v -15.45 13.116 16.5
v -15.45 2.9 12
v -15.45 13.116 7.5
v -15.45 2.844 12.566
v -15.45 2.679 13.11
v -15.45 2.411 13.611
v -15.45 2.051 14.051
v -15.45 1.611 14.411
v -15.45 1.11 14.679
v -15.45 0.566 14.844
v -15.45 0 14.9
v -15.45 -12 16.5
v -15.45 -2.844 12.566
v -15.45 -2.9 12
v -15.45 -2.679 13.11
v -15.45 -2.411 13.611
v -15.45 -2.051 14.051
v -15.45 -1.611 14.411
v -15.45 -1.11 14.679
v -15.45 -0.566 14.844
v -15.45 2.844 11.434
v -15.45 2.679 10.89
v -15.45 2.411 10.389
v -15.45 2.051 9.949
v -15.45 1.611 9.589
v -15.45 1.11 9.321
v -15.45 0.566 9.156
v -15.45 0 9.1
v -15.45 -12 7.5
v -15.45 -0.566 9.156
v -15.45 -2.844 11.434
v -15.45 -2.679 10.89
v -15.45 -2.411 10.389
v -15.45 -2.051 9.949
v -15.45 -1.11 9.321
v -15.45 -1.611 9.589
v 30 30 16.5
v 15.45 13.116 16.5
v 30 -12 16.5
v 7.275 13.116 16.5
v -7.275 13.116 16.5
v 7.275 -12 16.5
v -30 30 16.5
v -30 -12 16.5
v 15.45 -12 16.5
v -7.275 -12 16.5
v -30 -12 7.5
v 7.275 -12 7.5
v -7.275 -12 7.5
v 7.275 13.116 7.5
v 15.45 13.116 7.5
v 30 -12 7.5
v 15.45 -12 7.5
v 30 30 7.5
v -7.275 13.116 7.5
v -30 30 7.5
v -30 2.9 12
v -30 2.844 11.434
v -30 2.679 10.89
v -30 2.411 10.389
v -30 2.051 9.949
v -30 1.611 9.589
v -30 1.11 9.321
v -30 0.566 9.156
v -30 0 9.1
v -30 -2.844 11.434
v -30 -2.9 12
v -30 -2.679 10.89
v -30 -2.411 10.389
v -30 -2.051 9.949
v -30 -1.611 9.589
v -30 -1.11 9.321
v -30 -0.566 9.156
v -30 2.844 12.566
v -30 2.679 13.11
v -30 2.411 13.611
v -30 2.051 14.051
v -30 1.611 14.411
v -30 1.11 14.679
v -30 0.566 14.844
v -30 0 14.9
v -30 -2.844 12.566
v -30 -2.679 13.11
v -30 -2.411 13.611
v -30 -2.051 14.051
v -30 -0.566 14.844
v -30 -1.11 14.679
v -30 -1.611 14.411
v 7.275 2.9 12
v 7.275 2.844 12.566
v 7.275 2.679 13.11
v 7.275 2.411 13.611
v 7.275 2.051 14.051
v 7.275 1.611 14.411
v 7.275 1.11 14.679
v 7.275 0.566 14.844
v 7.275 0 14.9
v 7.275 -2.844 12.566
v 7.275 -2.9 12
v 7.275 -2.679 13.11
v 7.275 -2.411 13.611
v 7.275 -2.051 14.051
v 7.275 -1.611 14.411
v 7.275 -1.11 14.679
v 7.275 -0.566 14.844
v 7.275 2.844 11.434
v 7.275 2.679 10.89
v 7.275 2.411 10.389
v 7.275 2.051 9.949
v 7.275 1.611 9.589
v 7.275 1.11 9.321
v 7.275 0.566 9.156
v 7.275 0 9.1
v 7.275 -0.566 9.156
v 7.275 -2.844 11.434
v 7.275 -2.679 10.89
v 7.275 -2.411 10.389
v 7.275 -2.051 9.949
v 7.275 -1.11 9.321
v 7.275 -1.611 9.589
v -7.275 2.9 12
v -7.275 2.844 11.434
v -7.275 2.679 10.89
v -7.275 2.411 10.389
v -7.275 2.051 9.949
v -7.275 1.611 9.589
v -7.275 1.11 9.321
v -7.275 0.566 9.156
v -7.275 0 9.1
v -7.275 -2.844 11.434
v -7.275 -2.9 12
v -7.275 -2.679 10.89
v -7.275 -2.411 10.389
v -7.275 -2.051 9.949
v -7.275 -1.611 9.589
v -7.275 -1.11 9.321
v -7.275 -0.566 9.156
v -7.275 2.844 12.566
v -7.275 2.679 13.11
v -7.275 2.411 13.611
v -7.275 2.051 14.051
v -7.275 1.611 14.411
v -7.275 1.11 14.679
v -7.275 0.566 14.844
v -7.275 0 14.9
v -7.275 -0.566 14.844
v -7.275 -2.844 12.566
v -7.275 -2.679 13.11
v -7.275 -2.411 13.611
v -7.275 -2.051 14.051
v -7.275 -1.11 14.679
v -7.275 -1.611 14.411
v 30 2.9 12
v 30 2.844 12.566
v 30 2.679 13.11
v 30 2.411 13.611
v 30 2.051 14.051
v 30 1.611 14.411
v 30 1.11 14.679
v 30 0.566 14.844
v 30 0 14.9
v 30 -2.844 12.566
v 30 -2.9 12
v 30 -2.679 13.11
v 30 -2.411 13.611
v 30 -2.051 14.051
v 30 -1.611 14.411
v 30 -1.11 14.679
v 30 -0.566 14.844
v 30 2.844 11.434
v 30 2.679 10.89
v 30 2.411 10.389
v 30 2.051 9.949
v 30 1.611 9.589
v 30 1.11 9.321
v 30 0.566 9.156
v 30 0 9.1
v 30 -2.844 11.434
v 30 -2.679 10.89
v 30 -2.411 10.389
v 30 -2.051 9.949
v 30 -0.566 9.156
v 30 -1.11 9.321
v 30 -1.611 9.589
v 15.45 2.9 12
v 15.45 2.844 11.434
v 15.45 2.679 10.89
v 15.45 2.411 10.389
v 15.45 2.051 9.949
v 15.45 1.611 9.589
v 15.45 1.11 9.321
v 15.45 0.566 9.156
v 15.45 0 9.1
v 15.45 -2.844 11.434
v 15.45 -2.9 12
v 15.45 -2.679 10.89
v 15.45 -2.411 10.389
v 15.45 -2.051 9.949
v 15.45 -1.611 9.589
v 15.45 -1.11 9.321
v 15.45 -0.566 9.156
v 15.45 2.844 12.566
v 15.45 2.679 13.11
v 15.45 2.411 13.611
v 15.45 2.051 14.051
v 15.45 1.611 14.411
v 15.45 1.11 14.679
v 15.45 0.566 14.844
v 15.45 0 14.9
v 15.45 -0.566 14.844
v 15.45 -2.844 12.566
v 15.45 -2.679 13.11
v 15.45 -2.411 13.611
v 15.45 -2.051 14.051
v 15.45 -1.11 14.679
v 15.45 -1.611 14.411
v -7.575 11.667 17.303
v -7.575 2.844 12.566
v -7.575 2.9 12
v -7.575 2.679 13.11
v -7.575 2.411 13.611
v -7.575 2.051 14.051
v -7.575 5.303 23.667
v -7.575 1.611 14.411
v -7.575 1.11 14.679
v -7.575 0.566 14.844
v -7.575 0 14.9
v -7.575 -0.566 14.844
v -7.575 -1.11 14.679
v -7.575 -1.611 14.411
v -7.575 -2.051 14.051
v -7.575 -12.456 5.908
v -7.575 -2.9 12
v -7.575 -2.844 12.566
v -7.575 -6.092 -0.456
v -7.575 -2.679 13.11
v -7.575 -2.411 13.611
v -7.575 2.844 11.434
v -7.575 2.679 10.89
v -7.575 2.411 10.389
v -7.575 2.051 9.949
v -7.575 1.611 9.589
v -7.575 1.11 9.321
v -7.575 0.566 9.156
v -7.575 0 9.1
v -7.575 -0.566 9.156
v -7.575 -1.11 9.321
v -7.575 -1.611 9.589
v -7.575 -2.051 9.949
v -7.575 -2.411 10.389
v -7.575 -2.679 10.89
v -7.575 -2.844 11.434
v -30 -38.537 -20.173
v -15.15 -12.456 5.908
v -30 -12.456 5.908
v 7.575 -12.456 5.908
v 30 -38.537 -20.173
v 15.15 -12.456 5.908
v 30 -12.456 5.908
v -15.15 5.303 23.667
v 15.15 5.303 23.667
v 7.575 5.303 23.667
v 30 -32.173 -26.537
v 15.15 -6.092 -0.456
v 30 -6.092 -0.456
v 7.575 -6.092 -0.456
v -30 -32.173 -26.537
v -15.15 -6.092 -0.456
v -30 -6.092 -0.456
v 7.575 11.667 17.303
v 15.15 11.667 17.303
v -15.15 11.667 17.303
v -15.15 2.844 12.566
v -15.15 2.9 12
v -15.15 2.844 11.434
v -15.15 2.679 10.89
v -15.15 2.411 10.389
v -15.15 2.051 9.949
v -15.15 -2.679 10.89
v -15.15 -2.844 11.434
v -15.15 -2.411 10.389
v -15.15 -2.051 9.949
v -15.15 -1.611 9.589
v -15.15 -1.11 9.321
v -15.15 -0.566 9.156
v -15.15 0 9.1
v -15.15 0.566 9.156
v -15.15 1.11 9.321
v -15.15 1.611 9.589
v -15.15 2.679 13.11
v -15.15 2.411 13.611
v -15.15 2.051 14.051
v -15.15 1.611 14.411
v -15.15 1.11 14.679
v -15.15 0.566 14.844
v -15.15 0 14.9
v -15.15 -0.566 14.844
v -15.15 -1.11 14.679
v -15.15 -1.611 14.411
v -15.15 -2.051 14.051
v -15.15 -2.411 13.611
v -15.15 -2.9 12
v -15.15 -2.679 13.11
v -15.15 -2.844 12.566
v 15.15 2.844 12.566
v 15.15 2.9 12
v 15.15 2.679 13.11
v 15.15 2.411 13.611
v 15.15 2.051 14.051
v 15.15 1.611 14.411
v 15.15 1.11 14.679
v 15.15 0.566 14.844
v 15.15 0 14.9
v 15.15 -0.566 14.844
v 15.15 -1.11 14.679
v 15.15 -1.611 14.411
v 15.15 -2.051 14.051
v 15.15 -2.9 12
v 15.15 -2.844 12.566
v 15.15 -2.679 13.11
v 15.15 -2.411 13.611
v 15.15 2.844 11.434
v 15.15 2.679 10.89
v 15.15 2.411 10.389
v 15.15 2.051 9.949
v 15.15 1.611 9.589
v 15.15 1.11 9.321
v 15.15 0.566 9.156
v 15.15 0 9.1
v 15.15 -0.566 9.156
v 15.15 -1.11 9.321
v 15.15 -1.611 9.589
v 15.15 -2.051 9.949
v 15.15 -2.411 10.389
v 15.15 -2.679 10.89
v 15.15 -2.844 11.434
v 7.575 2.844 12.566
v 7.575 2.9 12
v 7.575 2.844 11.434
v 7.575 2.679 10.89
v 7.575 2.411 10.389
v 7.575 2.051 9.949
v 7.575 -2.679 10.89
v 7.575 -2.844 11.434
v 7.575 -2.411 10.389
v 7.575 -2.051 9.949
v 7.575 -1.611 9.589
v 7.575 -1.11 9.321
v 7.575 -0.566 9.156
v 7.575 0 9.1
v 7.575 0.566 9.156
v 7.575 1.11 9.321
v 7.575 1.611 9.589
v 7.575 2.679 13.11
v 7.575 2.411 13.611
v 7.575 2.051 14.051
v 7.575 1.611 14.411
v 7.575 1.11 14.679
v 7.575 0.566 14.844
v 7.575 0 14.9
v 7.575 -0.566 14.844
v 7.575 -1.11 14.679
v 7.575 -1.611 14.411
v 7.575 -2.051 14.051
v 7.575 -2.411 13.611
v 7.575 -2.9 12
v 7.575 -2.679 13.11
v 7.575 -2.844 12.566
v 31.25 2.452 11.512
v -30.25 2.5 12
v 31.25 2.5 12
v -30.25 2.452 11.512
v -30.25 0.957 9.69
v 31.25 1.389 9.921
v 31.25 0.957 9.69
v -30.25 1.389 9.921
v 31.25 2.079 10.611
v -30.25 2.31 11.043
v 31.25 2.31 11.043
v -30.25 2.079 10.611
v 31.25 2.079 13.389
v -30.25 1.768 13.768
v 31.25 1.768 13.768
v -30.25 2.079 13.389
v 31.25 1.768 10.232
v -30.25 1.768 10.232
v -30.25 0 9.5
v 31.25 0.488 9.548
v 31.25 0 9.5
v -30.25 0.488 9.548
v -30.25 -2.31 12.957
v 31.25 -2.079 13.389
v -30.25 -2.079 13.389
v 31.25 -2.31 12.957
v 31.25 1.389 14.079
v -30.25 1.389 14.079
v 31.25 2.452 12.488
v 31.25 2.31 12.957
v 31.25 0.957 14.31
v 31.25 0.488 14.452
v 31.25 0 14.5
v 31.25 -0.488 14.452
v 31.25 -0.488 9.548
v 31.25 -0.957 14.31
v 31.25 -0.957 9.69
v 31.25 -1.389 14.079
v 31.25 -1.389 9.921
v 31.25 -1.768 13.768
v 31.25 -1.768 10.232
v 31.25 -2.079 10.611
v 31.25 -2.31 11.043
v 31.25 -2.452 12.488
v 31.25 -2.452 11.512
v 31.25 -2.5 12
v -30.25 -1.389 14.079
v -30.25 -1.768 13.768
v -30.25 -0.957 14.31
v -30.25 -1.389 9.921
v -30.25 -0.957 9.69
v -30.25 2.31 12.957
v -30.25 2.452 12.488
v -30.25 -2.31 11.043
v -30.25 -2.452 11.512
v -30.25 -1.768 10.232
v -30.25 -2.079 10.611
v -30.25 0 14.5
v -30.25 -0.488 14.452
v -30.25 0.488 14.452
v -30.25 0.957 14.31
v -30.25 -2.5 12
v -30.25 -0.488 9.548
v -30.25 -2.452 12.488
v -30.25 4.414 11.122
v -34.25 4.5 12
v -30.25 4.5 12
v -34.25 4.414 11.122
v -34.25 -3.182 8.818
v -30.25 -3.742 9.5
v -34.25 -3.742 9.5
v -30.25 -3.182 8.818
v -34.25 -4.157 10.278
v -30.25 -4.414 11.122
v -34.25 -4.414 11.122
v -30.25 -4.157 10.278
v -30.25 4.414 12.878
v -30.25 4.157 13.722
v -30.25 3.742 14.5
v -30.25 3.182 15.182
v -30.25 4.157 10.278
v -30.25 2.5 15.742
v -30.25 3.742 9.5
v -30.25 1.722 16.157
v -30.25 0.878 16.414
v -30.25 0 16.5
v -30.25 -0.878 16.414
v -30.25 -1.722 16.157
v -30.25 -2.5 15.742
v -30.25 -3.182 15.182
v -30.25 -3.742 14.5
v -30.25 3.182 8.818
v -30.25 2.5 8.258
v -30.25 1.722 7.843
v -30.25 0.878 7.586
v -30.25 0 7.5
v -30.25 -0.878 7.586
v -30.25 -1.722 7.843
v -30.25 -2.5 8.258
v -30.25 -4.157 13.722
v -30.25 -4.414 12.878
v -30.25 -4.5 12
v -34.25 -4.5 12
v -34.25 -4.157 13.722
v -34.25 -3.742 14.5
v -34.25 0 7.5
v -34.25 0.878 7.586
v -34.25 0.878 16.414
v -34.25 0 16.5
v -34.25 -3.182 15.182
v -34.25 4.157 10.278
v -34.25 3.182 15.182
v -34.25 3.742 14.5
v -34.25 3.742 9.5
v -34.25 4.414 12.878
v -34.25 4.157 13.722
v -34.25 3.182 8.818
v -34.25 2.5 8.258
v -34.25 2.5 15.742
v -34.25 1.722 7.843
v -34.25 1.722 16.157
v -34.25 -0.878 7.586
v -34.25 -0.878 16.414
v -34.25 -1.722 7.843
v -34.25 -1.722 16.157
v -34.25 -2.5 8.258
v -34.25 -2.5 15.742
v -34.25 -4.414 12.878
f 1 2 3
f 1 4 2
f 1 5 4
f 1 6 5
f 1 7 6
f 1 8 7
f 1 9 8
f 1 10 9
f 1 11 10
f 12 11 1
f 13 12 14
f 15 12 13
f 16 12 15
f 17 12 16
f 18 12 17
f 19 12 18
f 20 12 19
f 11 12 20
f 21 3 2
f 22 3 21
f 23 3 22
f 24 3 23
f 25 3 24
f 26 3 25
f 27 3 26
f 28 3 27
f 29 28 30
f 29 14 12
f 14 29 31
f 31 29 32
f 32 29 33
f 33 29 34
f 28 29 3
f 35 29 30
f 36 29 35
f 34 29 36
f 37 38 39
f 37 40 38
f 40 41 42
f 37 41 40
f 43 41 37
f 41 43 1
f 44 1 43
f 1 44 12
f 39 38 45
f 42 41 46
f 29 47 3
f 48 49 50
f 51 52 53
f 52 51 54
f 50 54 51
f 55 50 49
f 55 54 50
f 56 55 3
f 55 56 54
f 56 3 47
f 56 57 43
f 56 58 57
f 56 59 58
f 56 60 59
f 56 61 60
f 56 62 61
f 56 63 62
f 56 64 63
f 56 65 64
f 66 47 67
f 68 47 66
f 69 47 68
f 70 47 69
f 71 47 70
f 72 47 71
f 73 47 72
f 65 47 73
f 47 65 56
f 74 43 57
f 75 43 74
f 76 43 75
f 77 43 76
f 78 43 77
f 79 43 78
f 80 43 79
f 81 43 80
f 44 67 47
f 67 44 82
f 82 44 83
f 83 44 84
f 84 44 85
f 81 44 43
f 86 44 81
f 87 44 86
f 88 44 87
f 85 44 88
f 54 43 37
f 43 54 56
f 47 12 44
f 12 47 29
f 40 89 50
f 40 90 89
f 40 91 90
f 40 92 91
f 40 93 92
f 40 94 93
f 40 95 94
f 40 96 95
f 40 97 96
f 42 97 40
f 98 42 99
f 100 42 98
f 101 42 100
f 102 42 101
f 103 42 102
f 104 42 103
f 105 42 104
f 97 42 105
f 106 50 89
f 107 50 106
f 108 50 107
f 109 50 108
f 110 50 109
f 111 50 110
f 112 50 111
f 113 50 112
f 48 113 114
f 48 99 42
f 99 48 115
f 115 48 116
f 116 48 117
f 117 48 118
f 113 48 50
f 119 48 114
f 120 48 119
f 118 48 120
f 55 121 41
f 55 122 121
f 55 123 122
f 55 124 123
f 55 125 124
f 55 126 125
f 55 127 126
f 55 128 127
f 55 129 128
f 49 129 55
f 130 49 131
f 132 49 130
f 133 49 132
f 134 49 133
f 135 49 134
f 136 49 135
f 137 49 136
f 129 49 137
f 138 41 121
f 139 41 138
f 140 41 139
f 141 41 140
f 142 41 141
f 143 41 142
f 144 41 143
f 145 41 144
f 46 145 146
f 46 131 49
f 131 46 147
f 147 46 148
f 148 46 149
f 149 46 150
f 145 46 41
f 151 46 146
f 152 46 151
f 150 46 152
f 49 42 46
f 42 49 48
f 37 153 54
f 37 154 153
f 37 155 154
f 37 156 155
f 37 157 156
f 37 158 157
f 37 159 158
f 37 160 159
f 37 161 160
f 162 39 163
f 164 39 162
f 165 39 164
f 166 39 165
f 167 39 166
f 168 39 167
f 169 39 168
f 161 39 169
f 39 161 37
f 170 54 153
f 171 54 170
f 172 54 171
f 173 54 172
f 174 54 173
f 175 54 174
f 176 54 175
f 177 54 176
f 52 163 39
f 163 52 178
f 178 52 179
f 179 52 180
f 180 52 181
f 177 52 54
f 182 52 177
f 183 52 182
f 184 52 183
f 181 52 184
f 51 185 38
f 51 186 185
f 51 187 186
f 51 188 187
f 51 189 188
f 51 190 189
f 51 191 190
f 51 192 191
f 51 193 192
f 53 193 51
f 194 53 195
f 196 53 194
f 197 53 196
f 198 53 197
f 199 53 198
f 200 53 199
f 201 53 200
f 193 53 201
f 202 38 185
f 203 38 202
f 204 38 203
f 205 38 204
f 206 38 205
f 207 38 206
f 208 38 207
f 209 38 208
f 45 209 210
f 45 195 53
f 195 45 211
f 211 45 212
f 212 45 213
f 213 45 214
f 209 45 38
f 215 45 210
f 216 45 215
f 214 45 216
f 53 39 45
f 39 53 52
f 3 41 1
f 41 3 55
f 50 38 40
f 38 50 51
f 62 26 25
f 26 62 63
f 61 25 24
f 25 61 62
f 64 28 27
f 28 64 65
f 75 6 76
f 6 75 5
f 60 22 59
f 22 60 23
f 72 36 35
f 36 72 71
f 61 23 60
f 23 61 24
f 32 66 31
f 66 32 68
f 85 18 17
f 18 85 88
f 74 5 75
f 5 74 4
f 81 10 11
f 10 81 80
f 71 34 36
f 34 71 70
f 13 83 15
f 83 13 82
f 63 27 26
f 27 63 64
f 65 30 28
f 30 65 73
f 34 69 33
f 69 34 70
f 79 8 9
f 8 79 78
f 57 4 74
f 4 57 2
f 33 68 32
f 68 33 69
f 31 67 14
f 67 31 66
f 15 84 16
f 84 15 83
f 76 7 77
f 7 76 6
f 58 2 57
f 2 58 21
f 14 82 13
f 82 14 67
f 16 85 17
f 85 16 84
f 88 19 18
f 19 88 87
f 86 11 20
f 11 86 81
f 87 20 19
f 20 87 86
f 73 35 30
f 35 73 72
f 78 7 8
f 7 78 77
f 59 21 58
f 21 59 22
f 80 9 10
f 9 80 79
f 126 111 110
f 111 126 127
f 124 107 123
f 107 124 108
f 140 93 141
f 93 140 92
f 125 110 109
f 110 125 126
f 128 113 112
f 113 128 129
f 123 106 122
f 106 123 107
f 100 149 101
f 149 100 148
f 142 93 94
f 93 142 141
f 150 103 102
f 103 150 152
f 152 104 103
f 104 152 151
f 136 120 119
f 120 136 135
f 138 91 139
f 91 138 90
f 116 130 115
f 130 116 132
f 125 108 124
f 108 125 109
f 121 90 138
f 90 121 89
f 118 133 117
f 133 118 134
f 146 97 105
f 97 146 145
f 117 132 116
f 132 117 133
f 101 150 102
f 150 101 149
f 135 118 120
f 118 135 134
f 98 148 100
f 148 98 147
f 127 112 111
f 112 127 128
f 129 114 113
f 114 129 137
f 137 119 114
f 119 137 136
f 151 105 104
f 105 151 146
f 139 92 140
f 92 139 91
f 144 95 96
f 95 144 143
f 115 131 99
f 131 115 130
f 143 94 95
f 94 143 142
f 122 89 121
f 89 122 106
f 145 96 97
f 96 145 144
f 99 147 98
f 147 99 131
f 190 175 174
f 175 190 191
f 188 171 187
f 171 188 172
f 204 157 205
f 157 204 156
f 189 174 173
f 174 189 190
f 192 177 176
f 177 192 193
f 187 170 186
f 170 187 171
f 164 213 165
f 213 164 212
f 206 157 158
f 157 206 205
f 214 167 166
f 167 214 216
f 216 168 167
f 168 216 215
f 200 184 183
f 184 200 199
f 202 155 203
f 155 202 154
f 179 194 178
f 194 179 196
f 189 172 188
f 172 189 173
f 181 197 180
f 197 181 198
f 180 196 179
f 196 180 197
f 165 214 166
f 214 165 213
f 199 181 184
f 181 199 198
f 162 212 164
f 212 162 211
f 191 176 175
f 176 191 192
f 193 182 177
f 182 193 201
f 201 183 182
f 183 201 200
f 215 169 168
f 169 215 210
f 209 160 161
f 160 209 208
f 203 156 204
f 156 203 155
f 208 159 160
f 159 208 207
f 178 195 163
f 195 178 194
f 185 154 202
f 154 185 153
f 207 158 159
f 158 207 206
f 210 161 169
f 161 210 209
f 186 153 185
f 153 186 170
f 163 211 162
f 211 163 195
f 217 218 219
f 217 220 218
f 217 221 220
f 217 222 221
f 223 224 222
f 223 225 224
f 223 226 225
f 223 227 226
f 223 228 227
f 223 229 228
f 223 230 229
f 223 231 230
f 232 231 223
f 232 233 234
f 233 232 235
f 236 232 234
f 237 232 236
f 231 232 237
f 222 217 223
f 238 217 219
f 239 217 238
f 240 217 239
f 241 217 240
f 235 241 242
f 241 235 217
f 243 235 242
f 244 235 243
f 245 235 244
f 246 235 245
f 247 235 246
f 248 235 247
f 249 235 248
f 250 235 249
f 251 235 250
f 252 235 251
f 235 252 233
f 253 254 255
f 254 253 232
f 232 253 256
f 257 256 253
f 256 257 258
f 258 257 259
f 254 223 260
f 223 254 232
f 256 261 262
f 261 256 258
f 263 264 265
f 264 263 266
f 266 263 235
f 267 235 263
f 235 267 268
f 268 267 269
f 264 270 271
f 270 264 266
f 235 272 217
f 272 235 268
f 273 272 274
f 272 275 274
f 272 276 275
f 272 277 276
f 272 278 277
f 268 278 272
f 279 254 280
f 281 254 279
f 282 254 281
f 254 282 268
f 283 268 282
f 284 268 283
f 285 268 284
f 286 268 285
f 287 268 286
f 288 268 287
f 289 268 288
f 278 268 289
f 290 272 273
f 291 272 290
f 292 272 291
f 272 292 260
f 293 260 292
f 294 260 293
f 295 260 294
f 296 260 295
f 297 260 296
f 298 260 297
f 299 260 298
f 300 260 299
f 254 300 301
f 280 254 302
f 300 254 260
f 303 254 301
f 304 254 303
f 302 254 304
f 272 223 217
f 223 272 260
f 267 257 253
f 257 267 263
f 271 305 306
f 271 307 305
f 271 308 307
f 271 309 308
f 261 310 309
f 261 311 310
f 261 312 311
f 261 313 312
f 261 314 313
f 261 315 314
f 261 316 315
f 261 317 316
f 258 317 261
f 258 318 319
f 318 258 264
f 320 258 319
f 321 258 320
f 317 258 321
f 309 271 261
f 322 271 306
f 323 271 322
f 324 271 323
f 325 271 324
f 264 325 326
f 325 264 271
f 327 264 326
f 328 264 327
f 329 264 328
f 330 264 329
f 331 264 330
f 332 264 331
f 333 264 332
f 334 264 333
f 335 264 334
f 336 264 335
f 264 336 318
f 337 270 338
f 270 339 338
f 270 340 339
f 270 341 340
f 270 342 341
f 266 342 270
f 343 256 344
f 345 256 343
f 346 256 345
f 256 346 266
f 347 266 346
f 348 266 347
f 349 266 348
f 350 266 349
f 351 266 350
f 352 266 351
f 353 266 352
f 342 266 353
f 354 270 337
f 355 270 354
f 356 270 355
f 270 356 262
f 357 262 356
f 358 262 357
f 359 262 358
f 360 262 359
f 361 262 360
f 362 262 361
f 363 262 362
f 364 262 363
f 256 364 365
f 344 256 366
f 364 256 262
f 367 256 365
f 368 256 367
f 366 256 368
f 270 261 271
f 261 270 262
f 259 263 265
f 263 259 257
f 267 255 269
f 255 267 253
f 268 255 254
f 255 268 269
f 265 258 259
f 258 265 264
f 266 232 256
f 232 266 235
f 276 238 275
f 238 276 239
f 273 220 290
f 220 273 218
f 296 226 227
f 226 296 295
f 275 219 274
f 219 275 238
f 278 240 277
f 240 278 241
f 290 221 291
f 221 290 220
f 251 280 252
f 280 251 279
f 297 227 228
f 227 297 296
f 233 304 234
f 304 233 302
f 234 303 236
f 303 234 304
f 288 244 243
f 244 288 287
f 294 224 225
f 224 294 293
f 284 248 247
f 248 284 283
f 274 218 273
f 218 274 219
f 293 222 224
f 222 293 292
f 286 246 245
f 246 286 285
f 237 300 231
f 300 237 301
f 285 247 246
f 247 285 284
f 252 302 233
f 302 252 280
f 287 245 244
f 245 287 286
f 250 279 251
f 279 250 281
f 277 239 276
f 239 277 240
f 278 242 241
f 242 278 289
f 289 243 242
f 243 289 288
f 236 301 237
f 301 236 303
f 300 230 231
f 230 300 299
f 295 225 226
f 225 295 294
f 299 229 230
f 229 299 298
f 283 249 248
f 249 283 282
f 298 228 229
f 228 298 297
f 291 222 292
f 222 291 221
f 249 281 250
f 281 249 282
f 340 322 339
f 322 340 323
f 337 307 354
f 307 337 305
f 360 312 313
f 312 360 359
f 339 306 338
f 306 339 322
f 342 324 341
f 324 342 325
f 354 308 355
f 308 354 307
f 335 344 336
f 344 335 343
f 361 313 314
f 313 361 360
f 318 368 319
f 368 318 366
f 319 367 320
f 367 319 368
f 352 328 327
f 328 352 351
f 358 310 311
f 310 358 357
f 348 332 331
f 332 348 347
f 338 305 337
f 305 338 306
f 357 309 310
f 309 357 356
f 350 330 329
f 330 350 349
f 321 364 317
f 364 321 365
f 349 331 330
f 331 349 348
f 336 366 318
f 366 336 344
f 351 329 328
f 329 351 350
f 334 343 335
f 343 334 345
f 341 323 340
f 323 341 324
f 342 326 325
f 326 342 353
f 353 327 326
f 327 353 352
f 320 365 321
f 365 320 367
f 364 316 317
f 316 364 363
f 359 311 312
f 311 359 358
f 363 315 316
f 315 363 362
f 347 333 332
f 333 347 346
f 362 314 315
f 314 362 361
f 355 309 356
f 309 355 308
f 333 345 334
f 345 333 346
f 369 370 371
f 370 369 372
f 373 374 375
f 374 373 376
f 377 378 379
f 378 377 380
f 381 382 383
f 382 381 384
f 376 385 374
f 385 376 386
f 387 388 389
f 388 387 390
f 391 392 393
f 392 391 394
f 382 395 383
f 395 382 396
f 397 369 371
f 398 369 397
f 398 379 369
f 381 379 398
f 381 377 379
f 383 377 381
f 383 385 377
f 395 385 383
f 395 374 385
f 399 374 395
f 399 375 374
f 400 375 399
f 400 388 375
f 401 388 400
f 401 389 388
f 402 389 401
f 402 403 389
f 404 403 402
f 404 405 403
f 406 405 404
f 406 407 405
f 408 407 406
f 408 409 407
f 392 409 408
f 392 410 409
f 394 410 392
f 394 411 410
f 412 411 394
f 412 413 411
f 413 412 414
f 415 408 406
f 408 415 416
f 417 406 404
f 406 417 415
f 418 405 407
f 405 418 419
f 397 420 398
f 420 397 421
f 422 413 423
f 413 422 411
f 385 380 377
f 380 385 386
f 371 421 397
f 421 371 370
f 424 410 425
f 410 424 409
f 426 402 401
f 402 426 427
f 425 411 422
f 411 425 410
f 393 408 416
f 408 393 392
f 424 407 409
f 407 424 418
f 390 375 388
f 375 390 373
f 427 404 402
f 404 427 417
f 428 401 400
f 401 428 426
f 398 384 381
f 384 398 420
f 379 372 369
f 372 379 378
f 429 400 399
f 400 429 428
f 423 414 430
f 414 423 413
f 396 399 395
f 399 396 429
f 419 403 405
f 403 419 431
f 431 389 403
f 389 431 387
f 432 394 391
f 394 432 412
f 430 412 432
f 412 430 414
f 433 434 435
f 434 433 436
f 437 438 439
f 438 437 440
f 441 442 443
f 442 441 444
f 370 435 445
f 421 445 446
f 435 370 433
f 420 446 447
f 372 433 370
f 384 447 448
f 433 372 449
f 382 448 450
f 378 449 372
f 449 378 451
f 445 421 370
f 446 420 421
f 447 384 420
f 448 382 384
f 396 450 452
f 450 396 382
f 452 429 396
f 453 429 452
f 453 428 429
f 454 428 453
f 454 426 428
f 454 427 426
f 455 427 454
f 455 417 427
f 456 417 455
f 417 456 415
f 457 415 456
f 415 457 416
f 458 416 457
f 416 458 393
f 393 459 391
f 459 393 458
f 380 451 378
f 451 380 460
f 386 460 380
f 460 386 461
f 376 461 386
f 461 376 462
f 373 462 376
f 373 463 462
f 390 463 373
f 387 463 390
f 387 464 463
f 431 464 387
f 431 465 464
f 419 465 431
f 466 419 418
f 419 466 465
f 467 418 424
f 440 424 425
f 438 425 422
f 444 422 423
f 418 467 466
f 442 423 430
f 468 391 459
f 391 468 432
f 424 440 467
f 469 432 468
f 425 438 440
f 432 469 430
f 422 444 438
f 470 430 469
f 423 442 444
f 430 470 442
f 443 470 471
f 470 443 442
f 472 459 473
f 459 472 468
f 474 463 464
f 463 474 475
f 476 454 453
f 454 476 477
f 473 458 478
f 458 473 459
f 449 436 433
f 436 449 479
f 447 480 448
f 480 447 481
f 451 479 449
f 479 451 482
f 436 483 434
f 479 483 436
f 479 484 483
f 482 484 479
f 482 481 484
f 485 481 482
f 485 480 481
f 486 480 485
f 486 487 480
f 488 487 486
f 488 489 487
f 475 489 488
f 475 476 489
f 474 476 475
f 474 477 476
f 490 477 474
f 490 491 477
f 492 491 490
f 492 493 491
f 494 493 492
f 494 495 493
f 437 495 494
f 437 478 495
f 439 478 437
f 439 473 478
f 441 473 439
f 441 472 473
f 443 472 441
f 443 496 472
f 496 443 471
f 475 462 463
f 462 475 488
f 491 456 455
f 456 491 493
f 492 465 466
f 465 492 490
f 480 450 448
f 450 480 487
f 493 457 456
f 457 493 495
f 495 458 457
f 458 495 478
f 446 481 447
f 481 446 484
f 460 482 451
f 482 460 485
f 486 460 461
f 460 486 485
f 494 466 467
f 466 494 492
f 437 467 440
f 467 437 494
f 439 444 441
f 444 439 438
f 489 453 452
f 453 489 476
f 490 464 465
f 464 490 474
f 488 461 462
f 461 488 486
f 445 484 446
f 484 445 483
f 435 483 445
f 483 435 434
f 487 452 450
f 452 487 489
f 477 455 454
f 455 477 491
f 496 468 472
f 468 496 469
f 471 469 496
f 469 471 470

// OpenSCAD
$fn = 32;

// ------------------------------------------------------------------------
// Butt hinge: hinge 60 mm, leaf swung 45 deg
// Every part is its own module, assembly() places every instance.
// ------------------------------------------------------------------------

// --- part 1 ---
module hinge_base() {
  difference() {
    union() {
      translate([-30, -12, -4.5]) cube([14.55, 42, 9]);
      translate([-7.275, -12, -4.5]) cube([14.55, 42, 9]);
      translate([15.45, -12, -4.5]) cube([14.55, 42, 9]);
      translate([-30, 13.116, -4.5]) cube([60, 16.884, 9]);
    }
    translate([-22.725, 0, 0]) rotate([0, 90, 0]) cylinder(h = 16.55, d = 5.8, center = true);
    translate([0, 0, 0]) rotate([0, 90, 0]) cylinder(h = 16.55, d = 5.8, center = true);
    translate([22.725, 0, 0]) rotate([0, 90, 0]) cylinder(h = 16.55, d = 5.8, center = true);
  }
}

// --- part 2 ---
module hinge_mover() {
  difference() {
    union() {
      translate([-15.15, -50, -4.5]) cube([7.575, 62, 9]);
      translate([7.575, -50, -4.5]) cube([7.575, 62, 9]);
      translate([-30, -50, -4.5]) cube([60, 36.884, 9]);
    }
    translate([-11.362, 0, 0]) rotate([0, 90, 0]) cylinder(h = 9.575, d = 5.8, center = true);
    translate([11.362, 0, 0]) rotate([0, 90, 0]) cylinder(h = 9.575, d = 5.8, center = true);
  }
}

// --- part 3 ---
module hinge_pin() {
  rotate([0, 90, 0]) cylinder(h = 62.5, d = 5, center = true);
  translate([-34.25, 0, 0]) rotate([0, 90, 0]) cylinder(h = 4, d = 9);
}

// --- assembly ---
module assembly() {
  color([0.80, 0.24, 0.20]) translate([0, 0, 12]) rotate([0, 0, 0]) hinge_base();
  color([0.20, 0.45, 0.75]) translate([0, 0, 12]) rotate([45, 0, 0]) hinge_mover();
  color([0.25, 0.62, 0.32]) translate([0, 0, 12]) rotate([0, 0, 0]) hinge_pin();
}

assembly();
